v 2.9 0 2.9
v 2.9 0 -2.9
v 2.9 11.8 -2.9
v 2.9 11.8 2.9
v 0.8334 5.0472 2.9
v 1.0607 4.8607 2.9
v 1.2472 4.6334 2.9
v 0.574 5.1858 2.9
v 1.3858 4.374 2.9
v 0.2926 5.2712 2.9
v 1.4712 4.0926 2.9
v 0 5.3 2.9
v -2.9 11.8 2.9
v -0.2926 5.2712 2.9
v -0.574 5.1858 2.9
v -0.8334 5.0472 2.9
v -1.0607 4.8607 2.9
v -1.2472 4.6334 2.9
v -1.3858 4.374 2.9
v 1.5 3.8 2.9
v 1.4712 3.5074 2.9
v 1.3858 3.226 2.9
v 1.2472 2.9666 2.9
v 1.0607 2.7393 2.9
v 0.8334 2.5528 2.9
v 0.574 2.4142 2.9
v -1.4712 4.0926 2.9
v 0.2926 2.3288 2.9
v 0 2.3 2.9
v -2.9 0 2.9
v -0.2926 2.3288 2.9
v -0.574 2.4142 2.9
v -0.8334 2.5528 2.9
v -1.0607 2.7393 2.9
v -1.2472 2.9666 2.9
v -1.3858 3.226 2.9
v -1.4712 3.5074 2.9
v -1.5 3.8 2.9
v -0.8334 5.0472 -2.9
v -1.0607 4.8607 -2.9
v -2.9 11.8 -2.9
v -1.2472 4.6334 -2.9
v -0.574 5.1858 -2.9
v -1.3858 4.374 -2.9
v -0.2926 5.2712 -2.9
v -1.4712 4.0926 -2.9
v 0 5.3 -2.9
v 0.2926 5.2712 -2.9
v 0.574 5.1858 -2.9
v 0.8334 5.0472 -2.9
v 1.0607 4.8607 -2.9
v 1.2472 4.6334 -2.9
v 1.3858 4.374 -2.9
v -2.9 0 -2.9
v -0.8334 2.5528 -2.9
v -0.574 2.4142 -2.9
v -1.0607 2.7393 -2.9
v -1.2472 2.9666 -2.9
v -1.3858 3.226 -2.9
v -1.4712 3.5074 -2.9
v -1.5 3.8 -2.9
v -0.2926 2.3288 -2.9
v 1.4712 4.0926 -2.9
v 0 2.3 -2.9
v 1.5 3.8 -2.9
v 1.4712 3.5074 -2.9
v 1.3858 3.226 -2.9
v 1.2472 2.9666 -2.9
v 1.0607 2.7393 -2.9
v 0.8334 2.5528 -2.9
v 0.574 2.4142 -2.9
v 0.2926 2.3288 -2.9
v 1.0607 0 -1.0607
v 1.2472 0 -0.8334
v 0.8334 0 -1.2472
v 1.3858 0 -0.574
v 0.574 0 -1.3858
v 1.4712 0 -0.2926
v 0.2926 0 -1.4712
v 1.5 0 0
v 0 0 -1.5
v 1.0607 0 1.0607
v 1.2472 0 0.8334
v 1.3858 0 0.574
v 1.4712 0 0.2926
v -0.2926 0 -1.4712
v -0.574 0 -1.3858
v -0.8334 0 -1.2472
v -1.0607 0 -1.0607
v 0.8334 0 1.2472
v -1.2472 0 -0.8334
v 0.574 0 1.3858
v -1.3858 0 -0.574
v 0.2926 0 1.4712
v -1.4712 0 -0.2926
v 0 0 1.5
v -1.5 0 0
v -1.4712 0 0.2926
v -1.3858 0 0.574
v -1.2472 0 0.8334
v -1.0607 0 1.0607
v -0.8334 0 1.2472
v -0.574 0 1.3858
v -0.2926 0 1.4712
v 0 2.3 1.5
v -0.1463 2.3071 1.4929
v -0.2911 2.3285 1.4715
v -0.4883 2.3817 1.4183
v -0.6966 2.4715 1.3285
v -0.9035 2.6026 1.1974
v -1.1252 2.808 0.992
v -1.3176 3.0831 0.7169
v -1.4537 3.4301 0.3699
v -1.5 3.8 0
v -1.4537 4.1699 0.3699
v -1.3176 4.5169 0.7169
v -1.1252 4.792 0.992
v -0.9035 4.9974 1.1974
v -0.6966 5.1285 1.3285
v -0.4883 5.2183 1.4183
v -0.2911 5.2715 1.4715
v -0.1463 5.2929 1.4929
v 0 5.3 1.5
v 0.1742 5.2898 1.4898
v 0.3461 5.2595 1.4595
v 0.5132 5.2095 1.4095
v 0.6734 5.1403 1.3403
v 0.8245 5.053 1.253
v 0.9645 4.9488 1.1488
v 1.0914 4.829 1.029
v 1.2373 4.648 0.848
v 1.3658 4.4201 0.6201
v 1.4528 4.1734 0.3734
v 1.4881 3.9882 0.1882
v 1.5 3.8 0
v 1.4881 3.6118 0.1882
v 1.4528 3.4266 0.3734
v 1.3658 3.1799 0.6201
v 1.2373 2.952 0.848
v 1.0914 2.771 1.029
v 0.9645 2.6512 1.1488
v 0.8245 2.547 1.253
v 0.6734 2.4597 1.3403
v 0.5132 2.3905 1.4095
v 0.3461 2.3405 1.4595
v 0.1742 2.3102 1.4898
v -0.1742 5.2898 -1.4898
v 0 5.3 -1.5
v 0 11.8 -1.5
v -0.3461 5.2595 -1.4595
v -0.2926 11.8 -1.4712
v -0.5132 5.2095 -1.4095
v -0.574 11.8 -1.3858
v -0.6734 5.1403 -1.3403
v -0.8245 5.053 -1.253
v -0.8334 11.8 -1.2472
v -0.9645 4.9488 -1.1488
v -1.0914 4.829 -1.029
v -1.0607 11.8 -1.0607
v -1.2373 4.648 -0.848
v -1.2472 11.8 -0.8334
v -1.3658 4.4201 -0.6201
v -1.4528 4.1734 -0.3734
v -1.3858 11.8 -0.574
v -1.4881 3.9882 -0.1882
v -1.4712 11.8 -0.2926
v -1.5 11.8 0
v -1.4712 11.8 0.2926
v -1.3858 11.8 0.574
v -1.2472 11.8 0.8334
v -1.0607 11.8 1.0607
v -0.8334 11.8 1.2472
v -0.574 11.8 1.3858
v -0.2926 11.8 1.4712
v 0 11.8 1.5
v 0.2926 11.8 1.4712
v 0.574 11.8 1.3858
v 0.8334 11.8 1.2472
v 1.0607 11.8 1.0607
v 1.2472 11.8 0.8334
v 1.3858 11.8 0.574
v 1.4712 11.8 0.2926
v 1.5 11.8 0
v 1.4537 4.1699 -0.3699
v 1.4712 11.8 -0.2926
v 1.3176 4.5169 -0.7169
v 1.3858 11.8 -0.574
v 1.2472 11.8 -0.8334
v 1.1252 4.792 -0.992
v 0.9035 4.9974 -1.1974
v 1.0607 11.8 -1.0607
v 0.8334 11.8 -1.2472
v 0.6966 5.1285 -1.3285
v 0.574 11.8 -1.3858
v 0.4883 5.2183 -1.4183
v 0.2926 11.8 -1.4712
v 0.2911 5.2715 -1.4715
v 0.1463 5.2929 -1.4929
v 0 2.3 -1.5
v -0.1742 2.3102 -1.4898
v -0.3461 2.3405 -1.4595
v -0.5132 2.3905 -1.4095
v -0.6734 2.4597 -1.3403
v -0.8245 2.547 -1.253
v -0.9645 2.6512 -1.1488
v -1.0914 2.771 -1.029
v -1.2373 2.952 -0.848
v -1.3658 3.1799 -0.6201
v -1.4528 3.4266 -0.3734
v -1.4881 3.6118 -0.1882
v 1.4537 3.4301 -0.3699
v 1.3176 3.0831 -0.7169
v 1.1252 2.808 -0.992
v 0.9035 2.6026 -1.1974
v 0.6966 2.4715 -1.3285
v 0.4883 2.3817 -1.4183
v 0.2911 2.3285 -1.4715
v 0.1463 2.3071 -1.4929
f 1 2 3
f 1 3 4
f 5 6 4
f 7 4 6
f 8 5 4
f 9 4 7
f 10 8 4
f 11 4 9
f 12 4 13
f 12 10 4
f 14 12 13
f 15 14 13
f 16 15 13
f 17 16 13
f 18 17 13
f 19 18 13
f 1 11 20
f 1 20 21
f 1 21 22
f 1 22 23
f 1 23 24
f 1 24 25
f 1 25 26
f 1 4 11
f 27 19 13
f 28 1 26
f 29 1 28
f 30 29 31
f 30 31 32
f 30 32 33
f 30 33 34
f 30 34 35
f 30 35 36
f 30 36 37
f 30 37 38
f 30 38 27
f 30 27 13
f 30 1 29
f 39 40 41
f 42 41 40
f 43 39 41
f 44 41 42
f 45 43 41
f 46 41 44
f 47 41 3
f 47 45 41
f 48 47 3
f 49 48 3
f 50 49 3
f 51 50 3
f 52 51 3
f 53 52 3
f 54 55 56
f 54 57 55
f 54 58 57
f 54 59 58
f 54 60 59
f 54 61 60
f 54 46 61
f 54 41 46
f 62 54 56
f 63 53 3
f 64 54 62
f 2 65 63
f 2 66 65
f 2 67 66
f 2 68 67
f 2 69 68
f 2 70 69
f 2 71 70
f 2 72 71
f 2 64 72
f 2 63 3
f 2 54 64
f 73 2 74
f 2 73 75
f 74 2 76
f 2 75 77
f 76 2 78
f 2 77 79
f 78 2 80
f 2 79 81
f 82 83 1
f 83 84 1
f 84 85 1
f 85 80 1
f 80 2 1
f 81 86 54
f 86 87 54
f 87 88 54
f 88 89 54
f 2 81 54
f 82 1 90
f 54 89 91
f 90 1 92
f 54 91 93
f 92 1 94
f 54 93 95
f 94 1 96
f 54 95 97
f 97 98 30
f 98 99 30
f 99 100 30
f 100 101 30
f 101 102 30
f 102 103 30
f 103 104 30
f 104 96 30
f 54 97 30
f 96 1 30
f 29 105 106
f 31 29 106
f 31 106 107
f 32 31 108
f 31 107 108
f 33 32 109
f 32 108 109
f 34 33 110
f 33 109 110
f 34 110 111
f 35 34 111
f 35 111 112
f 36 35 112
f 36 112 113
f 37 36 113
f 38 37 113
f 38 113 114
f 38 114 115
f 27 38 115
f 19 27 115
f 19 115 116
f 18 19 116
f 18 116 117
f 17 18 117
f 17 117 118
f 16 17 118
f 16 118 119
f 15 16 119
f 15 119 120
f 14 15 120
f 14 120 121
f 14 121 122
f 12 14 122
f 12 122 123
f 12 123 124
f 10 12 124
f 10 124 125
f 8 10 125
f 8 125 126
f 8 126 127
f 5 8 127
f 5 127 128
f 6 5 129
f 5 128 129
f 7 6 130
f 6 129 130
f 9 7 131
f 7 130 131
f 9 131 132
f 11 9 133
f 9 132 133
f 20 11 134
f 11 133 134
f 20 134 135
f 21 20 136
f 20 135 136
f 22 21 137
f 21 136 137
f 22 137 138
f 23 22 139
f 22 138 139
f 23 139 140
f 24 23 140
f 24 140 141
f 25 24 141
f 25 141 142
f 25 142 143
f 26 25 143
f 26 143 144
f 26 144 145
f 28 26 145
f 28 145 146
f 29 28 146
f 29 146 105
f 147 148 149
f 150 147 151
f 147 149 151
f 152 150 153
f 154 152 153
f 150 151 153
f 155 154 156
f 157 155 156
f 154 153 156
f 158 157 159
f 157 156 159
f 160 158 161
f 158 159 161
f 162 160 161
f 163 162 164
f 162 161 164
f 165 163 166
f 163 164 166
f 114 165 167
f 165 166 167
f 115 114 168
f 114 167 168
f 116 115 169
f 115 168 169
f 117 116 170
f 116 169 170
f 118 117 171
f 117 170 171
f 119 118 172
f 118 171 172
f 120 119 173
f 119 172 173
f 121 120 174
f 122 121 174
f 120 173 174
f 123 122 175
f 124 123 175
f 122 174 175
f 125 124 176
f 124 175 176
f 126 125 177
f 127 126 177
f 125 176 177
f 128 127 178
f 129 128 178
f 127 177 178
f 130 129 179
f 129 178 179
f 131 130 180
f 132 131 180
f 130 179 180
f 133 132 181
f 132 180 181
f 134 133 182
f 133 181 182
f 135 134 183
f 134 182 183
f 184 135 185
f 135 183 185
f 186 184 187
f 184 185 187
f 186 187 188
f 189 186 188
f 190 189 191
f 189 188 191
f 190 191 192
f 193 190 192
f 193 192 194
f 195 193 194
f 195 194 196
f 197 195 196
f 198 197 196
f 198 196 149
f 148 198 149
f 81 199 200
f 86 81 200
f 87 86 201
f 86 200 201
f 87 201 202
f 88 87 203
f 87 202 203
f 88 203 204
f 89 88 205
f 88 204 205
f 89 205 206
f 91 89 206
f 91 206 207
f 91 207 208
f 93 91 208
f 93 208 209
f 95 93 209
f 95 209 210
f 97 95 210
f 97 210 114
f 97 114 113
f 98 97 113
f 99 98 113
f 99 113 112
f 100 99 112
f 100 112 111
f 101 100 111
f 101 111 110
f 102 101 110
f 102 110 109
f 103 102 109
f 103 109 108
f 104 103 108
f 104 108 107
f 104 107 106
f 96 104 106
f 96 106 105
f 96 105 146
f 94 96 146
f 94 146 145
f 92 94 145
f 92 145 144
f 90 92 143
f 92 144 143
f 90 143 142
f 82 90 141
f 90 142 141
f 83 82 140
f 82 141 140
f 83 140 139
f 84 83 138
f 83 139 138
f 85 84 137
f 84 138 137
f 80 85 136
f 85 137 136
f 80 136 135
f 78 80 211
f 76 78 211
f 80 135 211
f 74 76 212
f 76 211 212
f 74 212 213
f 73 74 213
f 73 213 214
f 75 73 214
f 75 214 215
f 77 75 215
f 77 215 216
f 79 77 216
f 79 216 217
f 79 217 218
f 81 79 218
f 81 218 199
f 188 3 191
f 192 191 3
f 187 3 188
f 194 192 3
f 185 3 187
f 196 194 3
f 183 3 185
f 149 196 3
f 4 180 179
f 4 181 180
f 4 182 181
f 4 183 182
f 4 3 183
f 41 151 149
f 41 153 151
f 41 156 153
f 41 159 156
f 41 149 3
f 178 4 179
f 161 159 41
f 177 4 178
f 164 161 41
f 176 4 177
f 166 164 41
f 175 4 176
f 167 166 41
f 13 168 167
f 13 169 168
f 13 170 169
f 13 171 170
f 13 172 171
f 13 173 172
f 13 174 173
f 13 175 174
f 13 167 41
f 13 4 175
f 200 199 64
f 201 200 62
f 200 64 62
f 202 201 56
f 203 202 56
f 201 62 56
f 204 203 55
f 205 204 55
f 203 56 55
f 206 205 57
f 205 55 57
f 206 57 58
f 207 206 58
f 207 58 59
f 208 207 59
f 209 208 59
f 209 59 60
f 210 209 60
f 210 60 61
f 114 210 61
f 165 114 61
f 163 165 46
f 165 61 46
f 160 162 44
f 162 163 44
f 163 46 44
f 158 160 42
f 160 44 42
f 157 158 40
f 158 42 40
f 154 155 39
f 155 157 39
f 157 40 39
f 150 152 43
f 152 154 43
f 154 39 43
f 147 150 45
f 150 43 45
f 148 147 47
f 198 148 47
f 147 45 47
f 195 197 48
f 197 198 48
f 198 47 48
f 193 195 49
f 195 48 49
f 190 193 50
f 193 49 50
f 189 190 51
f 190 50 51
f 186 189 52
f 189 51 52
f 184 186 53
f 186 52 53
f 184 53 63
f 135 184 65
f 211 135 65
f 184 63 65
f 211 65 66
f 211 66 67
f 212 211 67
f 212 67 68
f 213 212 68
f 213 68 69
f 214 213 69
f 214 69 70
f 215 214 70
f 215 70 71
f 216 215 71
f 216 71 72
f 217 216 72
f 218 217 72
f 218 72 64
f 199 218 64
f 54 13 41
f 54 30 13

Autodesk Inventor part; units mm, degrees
ref_plane "YZ Plane" through (0, 0, 0) normal (1, 0, 0) x (0, 1, 0)
ref_plane "XZ Plane" through (0, 0, 0) normal (0, 1, 0) x (-1, 0, 0)
ref_plane "XY Plane" through (0, 0, 0) normal (0, 0, 1) x (1, 0, 0)
sketch "Sketch1" plane through (0, 0, 0) normal (0, 1, 0) x (-1, 0, 0)
  line L0 (-2.9, 2.9) -> (2.9, 2.9)
  line L1 (2.9, 2.9) -> (2.9, -2.9)
  line L2 (2.9, -2.9) -> (-2.9, -2.9)
  line L3 (-2.9, -2.9) -> (-2.9, 2.9)
  line L4 (-2.9, 2.9) -> (2.9, -2.9) construction
  line L5 (2.9, 2.9) -> (-2.9, -2.9) construction
  point P0 (0, 0)
  point P1 (0, 0)
  dimension "d0" = 5.8
extrude "Extrusion1" add sketch "Sketch1" along normal blind 11.8
hole "Hole1" at (0, 0, 0) direction (0, 1, 0) diameter 3 end through all
thread "Thread1" size "M3x0.5" class "6H" standard "ANSI Metric M Profile" full length
sketch "Sketch2" plane through (-2.9, 0, 2.9) normal (0, 0, 1) x (1, 0, 0)
  line L0 (5.8, 0) -> (0, 0) projected
  line L1 (5.8, 0) -> (5.8, 11.8) projected
  line L2 (0, 11.8) -> (5.8, 11.8) projected
  line L3 (0, 0) -> (0, 11.8) projected
  line L4 (2.9, 0) -> (2.9, 3.8) construction
  dimension "d12" = 3.8
hole "Hole2" at (0, 3.8, 2.9) direction (0, 0, -1) diameter 3 end through all
thread "Thread2" size "M3x0.5" class "6H" standard "ANSI Metric M Profile" full length
equation "\"square_width\" = d0"
equation "\"height\" = d1"
equation "\"side_hole_to_side_short\" = d12"
equation "\"side_hole_to_side_long\" = height - side_hole_to_side_short"
equation "\"side_hole_to_side_intermediate\" = 0.5 * square_width"
equation "\"central_hole_to_side\" = 0.5 * square_width"
equation "\"d1\" = 11.8"
properties part number "M3_cube_standoff"
